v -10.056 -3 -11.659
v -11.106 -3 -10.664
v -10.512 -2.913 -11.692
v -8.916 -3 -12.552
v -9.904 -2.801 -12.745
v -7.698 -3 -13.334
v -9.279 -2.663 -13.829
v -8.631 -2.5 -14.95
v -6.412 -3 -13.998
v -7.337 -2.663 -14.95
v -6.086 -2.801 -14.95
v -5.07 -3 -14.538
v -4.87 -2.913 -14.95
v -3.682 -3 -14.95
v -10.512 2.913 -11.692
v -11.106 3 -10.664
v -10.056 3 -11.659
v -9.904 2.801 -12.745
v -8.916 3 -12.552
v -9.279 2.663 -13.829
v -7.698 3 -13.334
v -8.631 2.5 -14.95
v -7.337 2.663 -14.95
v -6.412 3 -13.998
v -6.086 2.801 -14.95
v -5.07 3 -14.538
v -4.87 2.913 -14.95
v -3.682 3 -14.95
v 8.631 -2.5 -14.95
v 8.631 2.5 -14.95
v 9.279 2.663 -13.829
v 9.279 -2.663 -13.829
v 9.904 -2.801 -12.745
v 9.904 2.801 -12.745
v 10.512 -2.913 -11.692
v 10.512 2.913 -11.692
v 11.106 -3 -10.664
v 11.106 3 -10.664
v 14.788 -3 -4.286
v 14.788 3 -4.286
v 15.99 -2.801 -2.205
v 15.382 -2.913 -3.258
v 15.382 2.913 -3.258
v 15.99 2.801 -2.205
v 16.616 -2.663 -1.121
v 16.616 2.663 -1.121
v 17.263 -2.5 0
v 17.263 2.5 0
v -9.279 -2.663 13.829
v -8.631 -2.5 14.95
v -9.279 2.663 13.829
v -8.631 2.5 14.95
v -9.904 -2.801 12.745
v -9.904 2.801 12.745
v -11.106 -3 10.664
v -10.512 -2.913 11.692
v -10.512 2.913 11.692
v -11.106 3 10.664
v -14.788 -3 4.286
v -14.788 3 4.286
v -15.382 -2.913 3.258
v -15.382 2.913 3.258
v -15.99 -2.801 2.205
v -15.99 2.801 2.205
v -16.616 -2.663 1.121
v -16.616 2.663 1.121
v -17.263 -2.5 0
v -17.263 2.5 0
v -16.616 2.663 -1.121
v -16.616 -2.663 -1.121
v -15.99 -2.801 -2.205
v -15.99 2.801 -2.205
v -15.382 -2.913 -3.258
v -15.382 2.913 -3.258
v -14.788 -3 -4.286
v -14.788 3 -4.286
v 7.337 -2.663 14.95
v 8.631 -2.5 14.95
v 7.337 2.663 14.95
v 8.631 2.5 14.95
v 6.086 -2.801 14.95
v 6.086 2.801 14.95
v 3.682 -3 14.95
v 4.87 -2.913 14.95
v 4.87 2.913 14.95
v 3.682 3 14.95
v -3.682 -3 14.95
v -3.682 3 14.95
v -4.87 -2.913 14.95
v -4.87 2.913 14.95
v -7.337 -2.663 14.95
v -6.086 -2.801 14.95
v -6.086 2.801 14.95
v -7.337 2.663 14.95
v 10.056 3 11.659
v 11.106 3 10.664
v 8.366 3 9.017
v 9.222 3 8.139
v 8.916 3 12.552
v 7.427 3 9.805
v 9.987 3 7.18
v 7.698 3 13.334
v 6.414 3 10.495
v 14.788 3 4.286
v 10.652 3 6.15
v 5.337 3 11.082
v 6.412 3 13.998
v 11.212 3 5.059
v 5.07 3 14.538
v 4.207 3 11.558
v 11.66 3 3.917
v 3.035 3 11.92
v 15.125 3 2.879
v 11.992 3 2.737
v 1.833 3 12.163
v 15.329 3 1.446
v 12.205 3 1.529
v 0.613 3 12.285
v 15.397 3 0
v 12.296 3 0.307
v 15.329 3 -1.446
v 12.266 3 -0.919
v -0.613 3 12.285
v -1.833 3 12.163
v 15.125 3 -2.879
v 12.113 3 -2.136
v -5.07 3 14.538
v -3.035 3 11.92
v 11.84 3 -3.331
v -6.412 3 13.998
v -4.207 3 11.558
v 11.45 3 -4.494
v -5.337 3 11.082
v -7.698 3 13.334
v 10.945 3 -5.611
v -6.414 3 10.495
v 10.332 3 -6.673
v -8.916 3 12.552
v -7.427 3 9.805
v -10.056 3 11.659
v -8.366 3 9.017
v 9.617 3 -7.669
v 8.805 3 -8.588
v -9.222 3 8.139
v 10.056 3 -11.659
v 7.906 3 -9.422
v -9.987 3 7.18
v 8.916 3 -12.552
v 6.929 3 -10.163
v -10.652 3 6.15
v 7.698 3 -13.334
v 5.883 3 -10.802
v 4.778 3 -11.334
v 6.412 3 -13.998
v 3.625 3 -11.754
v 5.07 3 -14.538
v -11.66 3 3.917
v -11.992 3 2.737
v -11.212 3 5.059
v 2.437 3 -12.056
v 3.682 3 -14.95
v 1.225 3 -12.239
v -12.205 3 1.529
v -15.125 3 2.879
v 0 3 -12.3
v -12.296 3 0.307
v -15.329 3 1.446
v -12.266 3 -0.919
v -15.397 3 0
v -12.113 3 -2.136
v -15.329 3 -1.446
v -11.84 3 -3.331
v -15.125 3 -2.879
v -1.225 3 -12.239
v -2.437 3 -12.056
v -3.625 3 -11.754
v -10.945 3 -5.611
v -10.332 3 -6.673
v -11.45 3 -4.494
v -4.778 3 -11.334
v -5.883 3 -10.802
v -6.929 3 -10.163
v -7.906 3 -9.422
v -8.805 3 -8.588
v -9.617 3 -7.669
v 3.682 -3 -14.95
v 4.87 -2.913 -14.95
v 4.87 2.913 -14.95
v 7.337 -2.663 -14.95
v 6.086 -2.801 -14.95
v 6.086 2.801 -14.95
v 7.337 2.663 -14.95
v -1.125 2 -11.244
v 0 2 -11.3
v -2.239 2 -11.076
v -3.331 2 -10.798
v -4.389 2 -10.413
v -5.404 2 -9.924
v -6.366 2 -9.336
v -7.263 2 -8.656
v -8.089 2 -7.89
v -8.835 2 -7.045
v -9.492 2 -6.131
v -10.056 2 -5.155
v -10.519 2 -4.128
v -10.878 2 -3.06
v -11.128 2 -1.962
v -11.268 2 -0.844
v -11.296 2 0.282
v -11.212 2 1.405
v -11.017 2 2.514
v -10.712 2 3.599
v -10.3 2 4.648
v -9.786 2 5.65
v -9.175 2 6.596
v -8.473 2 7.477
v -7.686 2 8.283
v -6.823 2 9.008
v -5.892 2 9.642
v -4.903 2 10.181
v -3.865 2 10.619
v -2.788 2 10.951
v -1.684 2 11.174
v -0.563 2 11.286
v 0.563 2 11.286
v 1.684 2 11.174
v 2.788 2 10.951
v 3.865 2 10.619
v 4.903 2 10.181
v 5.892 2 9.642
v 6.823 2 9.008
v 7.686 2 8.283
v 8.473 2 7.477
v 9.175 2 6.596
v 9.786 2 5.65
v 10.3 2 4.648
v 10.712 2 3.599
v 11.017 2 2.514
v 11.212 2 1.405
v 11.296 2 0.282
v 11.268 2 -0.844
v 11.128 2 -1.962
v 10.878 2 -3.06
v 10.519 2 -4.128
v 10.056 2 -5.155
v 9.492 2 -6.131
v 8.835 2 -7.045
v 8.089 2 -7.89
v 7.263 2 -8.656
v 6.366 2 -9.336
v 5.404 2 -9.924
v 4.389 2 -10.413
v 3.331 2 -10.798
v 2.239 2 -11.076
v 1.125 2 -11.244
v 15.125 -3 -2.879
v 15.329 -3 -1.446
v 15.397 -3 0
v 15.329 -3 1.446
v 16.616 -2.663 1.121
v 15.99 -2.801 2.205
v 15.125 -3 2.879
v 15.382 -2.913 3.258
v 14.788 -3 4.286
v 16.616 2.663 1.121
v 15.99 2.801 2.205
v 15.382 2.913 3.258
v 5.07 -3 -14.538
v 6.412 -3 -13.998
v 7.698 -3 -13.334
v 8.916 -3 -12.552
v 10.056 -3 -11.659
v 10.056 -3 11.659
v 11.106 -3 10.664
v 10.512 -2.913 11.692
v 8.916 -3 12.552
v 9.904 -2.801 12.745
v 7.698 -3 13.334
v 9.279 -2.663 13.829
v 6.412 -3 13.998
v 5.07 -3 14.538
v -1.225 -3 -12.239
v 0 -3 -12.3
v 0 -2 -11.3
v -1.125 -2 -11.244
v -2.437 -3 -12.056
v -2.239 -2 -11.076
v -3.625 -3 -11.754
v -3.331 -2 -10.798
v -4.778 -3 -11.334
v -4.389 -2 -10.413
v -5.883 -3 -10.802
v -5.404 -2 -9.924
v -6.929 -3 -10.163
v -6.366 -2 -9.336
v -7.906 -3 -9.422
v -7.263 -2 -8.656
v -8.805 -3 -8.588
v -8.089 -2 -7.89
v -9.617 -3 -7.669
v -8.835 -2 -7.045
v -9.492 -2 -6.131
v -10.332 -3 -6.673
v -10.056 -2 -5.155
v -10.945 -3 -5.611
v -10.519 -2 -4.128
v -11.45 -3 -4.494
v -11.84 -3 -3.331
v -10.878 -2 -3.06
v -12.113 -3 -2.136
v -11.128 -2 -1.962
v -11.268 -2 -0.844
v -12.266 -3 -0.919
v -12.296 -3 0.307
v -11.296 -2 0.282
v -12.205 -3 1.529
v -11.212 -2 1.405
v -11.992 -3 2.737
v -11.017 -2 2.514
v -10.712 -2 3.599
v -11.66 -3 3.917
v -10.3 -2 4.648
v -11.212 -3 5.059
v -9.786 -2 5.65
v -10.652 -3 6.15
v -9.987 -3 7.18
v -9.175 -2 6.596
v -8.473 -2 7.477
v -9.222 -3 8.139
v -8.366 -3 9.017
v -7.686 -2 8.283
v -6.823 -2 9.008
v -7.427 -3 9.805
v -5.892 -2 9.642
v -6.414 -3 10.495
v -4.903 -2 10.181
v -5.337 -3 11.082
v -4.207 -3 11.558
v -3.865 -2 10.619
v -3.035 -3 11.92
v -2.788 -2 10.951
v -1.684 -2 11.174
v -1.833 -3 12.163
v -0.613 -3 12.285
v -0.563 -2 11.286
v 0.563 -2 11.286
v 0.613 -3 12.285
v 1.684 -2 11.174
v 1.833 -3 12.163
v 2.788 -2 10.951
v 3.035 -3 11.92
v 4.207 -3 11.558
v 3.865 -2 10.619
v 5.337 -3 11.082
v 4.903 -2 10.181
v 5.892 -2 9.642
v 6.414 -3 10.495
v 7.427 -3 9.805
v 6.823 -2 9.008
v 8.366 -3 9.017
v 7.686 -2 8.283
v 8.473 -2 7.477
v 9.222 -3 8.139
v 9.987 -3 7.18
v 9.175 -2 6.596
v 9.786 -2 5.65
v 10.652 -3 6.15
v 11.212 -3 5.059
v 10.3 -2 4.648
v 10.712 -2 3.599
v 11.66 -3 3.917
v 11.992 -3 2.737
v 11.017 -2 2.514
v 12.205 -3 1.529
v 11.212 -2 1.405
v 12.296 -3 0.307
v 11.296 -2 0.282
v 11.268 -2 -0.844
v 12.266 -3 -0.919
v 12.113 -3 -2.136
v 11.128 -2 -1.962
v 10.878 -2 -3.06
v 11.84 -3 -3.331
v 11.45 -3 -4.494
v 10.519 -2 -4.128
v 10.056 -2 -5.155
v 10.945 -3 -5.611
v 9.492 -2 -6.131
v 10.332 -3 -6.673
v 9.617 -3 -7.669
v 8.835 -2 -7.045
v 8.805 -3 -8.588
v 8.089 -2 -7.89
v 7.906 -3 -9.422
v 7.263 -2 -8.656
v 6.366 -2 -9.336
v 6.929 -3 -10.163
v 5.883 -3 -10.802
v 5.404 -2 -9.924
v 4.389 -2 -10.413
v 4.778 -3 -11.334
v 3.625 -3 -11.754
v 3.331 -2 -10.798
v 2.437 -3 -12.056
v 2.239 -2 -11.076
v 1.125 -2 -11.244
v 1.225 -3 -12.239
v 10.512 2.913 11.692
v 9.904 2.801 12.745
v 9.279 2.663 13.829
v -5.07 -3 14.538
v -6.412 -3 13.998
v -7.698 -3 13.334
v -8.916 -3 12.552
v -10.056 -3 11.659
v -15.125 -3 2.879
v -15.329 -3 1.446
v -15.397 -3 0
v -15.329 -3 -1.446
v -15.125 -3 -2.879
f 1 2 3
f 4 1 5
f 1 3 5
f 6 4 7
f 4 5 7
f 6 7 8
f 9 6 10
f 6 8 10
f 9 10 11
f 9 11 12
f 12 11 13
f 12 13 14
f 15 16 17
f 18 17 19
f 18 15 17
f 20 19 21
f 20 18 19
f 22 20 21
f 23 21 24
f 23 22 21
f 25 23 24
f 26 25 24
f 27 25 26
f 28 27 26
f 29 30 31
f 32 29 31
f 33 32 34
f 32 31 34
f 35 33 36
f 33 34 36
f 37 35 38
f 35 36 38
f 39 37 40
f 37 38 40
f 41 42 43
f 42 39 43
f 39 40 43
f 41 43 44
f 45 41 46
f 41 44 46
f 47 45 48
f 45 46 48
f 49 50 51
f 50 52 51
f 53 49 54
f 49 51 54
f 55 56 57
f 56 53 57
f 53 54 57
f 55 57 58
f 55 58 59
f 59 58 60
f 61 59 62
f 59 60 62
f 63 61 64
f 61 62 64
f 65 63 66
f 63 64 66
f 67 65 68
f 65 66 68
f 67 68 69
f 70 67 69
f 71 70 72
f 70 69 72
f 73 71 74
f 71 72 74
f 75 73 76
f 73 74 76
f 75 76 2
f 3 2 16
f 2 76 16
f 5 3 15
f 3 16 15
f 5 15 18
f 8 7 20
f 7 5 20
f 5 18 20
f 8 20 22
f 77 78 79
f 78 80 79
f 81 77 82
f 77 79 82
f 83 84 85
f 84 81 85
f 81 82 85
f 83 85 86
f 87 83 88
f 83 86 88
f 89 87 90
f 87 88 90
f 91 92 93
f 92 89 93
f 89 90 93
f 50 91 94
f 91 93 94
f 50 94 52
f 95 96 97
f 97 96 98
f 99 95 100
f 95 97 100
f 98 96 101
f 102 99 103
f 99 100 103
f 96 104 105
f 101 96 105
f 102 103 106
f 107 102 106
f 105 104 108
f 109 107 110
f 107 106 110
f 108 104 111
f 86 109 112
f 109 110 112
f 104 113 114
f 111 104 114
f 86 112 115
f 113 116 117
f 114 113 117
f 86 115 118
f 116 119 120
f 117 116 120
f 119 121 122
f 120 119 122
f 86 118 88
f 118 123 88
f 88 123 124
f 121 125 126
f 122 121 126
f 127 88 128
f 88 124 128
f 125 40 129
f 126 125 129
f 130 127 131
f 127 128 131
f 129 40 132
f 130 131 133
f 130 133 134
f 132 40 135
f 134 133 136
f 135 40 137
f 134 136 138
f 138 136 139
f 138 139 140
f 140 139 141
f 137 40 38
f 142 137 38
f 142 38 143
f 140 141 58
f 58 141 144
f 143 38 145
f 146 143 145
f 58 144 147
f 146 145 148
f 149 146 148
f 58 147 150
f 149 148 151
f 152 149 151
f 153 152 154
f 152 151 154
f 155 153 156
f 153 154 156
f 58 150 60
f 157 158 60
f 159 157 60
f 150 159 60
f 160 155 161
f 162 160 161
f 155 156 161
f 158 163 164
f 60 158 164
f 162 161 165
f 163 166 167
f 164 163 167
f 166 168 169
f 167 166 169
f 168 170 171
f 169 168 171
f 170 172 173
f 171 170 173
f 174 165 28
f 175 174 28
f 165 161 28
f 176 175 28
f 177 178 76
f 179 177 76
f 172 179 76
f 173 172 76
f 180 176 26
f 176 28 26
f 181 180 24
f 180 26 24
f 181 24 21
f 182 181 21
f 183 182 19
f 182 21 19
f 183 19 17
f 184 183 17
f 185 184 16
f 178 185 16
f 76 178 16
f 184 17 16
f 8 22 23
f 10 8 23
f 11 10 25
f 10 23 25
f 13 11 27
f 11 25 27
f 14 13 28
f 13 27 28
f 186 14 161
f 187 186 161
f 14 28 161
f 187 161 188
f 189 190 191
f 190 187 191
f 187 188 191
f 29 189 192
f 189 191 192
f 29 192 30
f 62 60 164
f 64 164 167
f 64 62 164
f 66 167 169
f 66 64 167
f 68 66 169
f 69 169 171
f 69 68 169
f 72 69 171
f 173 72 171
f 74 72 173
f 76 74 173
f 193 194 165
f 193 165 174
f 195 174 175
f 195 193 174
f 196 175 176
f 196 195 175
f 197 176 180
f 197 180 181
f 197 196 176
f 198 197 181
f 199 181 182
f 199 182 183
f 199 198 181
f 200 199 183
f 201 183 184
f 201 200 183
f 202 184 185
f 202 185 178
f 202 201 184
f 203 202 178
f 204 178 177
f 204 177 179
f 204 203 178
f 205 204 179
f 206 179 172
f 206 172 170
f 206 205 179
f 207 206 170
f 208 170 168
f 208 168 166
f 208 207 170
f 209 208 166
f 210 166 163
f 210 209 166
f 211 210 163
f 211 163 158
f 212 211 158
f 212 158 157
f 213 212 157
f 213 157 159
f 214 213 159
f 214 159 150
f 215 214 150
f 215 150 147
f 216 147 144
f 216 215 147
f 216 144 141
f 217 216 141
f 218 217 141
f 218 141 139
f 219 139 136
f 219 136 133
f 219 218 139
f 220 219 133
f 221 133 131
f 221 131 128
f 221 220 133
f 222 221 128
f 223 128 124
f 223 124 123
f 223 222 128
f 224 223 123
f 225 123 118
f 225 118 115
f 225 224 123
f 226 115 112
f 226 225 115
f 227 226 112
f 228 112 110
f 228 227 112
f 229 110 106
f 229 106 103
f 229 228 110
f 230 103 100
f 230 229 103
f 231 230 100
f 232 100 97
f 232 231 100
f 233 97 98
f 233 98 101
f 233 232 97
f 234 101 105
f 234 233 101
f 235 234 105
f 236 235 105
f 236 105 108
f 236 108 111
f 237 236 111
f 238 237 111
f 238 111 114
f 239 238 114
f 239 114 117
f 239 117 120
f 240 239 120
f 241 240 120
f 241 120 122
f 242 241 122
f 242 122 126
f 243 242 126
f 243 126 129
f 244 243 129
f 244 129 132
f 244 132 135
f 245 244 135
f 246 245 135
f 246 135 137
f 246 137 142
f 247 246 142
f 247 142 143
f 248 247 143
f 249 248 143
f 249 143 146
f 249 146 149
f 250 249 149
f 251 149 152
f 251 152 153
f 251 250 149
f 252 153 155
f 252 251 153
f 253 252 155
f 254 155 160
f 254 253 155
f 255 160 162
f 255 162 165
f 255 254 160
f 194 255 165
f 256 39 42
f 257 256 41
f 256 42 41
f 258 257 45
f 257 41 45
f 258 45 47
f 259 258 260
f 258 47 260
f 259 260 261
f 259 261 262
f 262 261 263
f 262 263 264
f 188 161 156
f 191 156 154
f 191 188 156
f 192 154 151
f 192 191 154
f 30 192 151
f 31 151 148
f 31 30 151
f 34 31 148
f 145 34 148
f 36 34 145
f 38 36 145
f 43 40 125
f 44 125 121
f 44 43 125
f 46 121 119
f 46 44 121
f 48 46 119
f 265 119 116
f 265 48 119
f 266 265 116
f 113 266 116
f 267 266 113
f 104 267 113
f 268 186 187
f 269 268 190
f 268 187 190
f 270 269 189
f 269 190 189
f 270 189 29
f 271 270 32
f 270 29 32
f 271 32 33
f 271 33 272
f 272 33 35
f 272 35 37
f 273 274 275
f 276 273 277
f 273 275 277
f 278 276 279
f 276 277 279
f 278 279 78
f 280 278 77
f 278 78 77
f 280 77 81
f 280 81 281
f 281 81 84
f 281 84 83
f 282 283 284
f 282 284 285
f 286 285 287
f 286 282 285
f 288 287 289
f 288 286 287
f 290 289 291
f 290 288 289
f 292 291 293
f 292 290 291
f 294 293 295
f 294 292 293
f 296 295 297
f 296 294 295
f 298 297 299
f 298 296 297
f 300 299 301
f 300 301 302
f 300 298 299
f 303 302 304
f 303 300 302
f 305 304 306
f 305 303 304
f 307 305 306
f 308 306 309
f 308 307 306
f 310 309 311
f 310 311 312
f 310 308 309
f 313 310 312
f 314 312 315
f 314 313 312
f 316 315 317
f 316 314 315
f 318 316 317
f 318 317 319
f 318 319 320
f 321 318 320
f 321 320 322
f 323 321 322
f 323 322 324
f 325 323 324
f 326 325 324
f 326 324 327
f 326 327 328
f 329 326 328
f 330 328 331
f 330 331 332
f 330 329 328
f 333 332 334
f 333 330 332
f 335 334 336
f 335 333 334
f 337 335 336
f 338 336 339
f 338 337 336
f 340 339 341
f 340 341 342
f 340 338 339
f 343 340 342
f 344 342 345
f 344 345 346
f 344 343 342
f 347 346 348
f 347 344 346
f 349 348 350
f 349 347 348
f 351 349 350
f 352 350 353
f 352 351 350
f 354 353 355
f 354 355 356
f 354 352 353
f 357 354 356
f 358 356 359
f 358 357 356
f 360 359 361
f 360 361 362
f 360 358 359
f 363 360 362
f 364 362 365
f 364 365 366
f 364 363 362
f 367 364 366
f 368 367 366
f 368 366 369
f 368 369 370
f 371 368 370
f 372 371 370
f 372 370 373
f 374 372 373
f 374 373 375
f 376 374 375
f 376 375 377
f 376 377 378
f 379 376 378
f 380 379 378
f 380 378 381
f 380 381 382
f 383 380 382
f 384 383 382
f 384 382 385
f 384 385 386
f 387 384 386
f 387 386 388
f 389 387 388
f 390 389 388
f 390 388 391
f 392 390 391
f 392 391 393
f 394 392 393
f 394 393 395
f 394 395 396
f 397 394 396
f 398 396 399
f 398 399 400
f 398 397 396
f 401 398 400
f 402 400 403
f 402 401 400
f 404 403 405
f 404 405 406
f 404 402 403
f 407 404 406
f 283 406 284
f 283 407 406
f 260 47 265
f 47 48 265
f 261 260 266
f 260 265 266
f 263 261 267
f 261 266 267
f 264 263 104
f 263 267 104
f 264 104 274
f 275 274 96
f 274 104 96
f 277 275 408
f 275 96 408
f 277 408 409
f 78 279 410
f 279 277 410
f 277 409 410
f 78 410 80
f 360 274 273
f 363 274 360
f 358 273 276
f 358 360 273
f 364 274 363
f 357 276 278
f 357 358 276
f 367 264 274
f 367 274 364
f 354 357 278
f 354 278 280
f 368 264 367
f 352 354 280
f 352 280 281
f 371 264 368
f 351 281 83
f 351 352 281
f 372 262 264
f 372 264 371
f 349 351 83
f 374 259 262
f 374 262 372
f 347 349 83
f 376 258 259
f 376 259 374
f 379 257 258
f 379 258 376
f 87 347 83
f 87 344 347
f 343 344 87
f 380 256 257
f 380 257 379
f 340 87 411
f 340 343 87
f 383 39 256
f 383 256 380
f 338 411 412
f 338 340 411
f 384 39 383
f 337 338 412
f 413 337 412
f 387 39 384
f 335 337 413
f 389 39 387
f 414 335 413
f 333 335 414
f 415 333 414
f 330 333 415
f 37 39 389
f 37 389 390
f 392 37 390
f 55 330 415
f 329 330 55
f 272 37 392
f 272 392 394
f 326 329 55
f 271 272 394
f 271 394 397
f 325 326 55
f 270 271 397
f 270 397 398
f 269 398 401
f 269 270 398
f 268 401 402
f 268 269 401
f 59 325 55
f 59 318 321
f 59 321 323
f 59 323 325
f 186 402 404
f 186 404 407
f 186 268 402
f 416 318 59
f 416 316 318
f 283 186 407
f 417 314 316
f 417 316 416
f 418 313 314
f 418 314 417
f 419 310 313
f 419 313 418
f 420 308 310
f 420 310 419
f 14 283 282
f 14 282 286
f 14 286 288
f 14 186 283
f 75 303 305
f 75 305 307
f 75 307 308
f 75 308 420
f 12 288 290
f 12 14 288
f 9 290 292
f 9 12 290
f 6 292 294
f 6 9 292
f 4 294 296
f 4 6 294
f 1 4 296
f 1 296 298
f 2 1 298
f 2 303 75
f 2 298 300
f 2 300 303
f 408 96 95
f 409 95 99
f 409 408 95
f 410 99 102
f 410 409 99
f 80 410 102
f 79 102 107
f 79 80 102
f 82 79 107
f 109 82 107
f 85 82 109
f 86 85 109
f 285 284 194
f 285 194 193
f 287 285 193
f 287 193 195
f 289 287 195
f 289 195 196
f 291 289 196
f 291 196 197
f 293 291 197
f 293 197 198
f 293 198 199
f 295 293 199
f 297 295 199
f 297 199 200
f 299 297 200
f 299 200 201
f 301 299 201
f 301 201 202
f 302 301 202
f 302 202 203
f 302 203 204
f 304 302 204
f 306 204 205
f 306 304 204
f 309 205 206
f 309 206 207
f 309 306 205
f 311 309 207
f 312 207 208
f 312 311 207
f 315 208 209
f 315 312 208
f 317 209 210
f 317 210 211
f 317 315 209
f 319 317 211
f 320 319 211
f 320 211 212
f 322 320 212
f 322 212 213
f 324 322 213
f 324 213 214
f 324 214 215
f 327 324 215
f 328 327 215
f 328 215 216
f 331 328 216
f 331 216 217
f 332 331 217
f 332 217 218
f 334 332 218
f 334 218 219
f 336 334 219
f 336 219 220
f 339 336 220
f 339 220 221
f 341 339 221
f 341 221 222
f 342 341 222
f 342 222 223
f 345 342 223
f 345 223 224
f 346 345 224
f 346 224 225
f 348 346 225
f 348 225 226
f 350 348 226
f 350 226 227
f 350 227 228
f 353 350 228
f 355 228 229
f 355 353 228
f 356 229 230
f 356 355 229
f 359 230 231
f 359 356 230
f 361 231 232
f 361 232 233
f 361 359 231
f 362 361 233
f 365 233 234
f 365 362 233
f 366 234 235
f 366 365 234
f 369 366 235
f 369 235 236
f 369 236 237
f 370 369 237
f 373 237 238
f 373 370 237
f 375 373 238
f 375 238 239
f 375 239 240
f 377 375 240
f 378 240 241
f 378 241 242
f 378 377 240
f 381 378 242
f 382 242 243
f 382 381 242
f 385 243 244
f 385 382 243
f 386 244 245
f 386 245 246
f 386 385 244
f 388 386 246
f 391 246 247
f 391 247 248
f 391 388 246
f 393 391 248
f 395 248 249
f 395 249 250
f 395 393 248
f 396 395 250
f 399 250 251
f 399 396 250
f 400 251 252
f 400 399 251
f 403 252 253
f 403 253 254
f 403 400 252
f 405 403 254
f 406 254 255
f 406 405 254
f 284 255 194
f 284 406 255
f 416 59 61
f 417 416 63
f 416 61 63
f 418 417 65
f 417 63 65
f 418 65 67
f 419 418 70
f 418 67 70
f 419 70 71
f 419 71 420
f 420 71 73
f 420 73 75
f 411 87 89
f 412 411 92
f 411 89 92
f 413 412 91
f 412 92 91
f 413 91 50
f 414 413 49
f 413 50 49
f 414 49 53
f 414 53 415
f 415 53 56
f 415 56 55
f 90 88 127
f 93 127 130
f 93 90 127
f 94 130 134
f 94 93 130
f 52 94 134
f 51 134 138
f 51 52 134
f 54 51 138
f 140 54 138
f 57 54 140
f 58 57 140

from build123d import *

# Parameters (mm, degrees)
ESQUISSE1_R          = 11.3
BASE_EXTRUSION_DEPTH = 3
CHANFREIN1_SIZE      = 1


with BuildPart() as part:
    # Esquisse1 → Base-Extrusion (new, symmetric)
    with BuildSketch(Plane(origin=(0, 0, 0), x_dir=(1, 0, 0), z_dir=(0, 1, 0))):
        Polygon((8.631386524, 14.95), (17.262773049, 0), (8.631386524, -14.95), (-8.631386524, -14.95), (-17.262773049, 0), (-8.631386524, 14.95), align=None)
        with Locations(Location((0, 0, 0), (0, 0, 90))):
            Circle(ESQUISSE1_R, mode=Mode.SUBTRACT)
    extrude(amount=BASE_EXTRUSION_DEPTH, both=True)

    # Chanfrein1
    chanfrein1_edges = [part.edges().sort_by_distance(p)[0] for p in [
        (0, 3, 11.3),
        (0, -3, 11.3),
    ]]
    chamfer(chanfrein1_edges, length=CHANFREIN1_SIZE)

    # Esquisse2 → Enlèvement de matière-Révolution3 (revolve, cut)
    with BuildSketch(Plane.XY):
        Polygon((15.396747645, 3), (17.262773049, 2.5), (17.262773049, 3), align=None)
        Polygon((17.262773049, -3), (15.396747645, -3), (17.262773049, -2.5), align=None)
    revolve(axis=Axis((0, 0, 0), (0, -1, 0)), mode=Mode.SUBTRACT)


solid = part.part
